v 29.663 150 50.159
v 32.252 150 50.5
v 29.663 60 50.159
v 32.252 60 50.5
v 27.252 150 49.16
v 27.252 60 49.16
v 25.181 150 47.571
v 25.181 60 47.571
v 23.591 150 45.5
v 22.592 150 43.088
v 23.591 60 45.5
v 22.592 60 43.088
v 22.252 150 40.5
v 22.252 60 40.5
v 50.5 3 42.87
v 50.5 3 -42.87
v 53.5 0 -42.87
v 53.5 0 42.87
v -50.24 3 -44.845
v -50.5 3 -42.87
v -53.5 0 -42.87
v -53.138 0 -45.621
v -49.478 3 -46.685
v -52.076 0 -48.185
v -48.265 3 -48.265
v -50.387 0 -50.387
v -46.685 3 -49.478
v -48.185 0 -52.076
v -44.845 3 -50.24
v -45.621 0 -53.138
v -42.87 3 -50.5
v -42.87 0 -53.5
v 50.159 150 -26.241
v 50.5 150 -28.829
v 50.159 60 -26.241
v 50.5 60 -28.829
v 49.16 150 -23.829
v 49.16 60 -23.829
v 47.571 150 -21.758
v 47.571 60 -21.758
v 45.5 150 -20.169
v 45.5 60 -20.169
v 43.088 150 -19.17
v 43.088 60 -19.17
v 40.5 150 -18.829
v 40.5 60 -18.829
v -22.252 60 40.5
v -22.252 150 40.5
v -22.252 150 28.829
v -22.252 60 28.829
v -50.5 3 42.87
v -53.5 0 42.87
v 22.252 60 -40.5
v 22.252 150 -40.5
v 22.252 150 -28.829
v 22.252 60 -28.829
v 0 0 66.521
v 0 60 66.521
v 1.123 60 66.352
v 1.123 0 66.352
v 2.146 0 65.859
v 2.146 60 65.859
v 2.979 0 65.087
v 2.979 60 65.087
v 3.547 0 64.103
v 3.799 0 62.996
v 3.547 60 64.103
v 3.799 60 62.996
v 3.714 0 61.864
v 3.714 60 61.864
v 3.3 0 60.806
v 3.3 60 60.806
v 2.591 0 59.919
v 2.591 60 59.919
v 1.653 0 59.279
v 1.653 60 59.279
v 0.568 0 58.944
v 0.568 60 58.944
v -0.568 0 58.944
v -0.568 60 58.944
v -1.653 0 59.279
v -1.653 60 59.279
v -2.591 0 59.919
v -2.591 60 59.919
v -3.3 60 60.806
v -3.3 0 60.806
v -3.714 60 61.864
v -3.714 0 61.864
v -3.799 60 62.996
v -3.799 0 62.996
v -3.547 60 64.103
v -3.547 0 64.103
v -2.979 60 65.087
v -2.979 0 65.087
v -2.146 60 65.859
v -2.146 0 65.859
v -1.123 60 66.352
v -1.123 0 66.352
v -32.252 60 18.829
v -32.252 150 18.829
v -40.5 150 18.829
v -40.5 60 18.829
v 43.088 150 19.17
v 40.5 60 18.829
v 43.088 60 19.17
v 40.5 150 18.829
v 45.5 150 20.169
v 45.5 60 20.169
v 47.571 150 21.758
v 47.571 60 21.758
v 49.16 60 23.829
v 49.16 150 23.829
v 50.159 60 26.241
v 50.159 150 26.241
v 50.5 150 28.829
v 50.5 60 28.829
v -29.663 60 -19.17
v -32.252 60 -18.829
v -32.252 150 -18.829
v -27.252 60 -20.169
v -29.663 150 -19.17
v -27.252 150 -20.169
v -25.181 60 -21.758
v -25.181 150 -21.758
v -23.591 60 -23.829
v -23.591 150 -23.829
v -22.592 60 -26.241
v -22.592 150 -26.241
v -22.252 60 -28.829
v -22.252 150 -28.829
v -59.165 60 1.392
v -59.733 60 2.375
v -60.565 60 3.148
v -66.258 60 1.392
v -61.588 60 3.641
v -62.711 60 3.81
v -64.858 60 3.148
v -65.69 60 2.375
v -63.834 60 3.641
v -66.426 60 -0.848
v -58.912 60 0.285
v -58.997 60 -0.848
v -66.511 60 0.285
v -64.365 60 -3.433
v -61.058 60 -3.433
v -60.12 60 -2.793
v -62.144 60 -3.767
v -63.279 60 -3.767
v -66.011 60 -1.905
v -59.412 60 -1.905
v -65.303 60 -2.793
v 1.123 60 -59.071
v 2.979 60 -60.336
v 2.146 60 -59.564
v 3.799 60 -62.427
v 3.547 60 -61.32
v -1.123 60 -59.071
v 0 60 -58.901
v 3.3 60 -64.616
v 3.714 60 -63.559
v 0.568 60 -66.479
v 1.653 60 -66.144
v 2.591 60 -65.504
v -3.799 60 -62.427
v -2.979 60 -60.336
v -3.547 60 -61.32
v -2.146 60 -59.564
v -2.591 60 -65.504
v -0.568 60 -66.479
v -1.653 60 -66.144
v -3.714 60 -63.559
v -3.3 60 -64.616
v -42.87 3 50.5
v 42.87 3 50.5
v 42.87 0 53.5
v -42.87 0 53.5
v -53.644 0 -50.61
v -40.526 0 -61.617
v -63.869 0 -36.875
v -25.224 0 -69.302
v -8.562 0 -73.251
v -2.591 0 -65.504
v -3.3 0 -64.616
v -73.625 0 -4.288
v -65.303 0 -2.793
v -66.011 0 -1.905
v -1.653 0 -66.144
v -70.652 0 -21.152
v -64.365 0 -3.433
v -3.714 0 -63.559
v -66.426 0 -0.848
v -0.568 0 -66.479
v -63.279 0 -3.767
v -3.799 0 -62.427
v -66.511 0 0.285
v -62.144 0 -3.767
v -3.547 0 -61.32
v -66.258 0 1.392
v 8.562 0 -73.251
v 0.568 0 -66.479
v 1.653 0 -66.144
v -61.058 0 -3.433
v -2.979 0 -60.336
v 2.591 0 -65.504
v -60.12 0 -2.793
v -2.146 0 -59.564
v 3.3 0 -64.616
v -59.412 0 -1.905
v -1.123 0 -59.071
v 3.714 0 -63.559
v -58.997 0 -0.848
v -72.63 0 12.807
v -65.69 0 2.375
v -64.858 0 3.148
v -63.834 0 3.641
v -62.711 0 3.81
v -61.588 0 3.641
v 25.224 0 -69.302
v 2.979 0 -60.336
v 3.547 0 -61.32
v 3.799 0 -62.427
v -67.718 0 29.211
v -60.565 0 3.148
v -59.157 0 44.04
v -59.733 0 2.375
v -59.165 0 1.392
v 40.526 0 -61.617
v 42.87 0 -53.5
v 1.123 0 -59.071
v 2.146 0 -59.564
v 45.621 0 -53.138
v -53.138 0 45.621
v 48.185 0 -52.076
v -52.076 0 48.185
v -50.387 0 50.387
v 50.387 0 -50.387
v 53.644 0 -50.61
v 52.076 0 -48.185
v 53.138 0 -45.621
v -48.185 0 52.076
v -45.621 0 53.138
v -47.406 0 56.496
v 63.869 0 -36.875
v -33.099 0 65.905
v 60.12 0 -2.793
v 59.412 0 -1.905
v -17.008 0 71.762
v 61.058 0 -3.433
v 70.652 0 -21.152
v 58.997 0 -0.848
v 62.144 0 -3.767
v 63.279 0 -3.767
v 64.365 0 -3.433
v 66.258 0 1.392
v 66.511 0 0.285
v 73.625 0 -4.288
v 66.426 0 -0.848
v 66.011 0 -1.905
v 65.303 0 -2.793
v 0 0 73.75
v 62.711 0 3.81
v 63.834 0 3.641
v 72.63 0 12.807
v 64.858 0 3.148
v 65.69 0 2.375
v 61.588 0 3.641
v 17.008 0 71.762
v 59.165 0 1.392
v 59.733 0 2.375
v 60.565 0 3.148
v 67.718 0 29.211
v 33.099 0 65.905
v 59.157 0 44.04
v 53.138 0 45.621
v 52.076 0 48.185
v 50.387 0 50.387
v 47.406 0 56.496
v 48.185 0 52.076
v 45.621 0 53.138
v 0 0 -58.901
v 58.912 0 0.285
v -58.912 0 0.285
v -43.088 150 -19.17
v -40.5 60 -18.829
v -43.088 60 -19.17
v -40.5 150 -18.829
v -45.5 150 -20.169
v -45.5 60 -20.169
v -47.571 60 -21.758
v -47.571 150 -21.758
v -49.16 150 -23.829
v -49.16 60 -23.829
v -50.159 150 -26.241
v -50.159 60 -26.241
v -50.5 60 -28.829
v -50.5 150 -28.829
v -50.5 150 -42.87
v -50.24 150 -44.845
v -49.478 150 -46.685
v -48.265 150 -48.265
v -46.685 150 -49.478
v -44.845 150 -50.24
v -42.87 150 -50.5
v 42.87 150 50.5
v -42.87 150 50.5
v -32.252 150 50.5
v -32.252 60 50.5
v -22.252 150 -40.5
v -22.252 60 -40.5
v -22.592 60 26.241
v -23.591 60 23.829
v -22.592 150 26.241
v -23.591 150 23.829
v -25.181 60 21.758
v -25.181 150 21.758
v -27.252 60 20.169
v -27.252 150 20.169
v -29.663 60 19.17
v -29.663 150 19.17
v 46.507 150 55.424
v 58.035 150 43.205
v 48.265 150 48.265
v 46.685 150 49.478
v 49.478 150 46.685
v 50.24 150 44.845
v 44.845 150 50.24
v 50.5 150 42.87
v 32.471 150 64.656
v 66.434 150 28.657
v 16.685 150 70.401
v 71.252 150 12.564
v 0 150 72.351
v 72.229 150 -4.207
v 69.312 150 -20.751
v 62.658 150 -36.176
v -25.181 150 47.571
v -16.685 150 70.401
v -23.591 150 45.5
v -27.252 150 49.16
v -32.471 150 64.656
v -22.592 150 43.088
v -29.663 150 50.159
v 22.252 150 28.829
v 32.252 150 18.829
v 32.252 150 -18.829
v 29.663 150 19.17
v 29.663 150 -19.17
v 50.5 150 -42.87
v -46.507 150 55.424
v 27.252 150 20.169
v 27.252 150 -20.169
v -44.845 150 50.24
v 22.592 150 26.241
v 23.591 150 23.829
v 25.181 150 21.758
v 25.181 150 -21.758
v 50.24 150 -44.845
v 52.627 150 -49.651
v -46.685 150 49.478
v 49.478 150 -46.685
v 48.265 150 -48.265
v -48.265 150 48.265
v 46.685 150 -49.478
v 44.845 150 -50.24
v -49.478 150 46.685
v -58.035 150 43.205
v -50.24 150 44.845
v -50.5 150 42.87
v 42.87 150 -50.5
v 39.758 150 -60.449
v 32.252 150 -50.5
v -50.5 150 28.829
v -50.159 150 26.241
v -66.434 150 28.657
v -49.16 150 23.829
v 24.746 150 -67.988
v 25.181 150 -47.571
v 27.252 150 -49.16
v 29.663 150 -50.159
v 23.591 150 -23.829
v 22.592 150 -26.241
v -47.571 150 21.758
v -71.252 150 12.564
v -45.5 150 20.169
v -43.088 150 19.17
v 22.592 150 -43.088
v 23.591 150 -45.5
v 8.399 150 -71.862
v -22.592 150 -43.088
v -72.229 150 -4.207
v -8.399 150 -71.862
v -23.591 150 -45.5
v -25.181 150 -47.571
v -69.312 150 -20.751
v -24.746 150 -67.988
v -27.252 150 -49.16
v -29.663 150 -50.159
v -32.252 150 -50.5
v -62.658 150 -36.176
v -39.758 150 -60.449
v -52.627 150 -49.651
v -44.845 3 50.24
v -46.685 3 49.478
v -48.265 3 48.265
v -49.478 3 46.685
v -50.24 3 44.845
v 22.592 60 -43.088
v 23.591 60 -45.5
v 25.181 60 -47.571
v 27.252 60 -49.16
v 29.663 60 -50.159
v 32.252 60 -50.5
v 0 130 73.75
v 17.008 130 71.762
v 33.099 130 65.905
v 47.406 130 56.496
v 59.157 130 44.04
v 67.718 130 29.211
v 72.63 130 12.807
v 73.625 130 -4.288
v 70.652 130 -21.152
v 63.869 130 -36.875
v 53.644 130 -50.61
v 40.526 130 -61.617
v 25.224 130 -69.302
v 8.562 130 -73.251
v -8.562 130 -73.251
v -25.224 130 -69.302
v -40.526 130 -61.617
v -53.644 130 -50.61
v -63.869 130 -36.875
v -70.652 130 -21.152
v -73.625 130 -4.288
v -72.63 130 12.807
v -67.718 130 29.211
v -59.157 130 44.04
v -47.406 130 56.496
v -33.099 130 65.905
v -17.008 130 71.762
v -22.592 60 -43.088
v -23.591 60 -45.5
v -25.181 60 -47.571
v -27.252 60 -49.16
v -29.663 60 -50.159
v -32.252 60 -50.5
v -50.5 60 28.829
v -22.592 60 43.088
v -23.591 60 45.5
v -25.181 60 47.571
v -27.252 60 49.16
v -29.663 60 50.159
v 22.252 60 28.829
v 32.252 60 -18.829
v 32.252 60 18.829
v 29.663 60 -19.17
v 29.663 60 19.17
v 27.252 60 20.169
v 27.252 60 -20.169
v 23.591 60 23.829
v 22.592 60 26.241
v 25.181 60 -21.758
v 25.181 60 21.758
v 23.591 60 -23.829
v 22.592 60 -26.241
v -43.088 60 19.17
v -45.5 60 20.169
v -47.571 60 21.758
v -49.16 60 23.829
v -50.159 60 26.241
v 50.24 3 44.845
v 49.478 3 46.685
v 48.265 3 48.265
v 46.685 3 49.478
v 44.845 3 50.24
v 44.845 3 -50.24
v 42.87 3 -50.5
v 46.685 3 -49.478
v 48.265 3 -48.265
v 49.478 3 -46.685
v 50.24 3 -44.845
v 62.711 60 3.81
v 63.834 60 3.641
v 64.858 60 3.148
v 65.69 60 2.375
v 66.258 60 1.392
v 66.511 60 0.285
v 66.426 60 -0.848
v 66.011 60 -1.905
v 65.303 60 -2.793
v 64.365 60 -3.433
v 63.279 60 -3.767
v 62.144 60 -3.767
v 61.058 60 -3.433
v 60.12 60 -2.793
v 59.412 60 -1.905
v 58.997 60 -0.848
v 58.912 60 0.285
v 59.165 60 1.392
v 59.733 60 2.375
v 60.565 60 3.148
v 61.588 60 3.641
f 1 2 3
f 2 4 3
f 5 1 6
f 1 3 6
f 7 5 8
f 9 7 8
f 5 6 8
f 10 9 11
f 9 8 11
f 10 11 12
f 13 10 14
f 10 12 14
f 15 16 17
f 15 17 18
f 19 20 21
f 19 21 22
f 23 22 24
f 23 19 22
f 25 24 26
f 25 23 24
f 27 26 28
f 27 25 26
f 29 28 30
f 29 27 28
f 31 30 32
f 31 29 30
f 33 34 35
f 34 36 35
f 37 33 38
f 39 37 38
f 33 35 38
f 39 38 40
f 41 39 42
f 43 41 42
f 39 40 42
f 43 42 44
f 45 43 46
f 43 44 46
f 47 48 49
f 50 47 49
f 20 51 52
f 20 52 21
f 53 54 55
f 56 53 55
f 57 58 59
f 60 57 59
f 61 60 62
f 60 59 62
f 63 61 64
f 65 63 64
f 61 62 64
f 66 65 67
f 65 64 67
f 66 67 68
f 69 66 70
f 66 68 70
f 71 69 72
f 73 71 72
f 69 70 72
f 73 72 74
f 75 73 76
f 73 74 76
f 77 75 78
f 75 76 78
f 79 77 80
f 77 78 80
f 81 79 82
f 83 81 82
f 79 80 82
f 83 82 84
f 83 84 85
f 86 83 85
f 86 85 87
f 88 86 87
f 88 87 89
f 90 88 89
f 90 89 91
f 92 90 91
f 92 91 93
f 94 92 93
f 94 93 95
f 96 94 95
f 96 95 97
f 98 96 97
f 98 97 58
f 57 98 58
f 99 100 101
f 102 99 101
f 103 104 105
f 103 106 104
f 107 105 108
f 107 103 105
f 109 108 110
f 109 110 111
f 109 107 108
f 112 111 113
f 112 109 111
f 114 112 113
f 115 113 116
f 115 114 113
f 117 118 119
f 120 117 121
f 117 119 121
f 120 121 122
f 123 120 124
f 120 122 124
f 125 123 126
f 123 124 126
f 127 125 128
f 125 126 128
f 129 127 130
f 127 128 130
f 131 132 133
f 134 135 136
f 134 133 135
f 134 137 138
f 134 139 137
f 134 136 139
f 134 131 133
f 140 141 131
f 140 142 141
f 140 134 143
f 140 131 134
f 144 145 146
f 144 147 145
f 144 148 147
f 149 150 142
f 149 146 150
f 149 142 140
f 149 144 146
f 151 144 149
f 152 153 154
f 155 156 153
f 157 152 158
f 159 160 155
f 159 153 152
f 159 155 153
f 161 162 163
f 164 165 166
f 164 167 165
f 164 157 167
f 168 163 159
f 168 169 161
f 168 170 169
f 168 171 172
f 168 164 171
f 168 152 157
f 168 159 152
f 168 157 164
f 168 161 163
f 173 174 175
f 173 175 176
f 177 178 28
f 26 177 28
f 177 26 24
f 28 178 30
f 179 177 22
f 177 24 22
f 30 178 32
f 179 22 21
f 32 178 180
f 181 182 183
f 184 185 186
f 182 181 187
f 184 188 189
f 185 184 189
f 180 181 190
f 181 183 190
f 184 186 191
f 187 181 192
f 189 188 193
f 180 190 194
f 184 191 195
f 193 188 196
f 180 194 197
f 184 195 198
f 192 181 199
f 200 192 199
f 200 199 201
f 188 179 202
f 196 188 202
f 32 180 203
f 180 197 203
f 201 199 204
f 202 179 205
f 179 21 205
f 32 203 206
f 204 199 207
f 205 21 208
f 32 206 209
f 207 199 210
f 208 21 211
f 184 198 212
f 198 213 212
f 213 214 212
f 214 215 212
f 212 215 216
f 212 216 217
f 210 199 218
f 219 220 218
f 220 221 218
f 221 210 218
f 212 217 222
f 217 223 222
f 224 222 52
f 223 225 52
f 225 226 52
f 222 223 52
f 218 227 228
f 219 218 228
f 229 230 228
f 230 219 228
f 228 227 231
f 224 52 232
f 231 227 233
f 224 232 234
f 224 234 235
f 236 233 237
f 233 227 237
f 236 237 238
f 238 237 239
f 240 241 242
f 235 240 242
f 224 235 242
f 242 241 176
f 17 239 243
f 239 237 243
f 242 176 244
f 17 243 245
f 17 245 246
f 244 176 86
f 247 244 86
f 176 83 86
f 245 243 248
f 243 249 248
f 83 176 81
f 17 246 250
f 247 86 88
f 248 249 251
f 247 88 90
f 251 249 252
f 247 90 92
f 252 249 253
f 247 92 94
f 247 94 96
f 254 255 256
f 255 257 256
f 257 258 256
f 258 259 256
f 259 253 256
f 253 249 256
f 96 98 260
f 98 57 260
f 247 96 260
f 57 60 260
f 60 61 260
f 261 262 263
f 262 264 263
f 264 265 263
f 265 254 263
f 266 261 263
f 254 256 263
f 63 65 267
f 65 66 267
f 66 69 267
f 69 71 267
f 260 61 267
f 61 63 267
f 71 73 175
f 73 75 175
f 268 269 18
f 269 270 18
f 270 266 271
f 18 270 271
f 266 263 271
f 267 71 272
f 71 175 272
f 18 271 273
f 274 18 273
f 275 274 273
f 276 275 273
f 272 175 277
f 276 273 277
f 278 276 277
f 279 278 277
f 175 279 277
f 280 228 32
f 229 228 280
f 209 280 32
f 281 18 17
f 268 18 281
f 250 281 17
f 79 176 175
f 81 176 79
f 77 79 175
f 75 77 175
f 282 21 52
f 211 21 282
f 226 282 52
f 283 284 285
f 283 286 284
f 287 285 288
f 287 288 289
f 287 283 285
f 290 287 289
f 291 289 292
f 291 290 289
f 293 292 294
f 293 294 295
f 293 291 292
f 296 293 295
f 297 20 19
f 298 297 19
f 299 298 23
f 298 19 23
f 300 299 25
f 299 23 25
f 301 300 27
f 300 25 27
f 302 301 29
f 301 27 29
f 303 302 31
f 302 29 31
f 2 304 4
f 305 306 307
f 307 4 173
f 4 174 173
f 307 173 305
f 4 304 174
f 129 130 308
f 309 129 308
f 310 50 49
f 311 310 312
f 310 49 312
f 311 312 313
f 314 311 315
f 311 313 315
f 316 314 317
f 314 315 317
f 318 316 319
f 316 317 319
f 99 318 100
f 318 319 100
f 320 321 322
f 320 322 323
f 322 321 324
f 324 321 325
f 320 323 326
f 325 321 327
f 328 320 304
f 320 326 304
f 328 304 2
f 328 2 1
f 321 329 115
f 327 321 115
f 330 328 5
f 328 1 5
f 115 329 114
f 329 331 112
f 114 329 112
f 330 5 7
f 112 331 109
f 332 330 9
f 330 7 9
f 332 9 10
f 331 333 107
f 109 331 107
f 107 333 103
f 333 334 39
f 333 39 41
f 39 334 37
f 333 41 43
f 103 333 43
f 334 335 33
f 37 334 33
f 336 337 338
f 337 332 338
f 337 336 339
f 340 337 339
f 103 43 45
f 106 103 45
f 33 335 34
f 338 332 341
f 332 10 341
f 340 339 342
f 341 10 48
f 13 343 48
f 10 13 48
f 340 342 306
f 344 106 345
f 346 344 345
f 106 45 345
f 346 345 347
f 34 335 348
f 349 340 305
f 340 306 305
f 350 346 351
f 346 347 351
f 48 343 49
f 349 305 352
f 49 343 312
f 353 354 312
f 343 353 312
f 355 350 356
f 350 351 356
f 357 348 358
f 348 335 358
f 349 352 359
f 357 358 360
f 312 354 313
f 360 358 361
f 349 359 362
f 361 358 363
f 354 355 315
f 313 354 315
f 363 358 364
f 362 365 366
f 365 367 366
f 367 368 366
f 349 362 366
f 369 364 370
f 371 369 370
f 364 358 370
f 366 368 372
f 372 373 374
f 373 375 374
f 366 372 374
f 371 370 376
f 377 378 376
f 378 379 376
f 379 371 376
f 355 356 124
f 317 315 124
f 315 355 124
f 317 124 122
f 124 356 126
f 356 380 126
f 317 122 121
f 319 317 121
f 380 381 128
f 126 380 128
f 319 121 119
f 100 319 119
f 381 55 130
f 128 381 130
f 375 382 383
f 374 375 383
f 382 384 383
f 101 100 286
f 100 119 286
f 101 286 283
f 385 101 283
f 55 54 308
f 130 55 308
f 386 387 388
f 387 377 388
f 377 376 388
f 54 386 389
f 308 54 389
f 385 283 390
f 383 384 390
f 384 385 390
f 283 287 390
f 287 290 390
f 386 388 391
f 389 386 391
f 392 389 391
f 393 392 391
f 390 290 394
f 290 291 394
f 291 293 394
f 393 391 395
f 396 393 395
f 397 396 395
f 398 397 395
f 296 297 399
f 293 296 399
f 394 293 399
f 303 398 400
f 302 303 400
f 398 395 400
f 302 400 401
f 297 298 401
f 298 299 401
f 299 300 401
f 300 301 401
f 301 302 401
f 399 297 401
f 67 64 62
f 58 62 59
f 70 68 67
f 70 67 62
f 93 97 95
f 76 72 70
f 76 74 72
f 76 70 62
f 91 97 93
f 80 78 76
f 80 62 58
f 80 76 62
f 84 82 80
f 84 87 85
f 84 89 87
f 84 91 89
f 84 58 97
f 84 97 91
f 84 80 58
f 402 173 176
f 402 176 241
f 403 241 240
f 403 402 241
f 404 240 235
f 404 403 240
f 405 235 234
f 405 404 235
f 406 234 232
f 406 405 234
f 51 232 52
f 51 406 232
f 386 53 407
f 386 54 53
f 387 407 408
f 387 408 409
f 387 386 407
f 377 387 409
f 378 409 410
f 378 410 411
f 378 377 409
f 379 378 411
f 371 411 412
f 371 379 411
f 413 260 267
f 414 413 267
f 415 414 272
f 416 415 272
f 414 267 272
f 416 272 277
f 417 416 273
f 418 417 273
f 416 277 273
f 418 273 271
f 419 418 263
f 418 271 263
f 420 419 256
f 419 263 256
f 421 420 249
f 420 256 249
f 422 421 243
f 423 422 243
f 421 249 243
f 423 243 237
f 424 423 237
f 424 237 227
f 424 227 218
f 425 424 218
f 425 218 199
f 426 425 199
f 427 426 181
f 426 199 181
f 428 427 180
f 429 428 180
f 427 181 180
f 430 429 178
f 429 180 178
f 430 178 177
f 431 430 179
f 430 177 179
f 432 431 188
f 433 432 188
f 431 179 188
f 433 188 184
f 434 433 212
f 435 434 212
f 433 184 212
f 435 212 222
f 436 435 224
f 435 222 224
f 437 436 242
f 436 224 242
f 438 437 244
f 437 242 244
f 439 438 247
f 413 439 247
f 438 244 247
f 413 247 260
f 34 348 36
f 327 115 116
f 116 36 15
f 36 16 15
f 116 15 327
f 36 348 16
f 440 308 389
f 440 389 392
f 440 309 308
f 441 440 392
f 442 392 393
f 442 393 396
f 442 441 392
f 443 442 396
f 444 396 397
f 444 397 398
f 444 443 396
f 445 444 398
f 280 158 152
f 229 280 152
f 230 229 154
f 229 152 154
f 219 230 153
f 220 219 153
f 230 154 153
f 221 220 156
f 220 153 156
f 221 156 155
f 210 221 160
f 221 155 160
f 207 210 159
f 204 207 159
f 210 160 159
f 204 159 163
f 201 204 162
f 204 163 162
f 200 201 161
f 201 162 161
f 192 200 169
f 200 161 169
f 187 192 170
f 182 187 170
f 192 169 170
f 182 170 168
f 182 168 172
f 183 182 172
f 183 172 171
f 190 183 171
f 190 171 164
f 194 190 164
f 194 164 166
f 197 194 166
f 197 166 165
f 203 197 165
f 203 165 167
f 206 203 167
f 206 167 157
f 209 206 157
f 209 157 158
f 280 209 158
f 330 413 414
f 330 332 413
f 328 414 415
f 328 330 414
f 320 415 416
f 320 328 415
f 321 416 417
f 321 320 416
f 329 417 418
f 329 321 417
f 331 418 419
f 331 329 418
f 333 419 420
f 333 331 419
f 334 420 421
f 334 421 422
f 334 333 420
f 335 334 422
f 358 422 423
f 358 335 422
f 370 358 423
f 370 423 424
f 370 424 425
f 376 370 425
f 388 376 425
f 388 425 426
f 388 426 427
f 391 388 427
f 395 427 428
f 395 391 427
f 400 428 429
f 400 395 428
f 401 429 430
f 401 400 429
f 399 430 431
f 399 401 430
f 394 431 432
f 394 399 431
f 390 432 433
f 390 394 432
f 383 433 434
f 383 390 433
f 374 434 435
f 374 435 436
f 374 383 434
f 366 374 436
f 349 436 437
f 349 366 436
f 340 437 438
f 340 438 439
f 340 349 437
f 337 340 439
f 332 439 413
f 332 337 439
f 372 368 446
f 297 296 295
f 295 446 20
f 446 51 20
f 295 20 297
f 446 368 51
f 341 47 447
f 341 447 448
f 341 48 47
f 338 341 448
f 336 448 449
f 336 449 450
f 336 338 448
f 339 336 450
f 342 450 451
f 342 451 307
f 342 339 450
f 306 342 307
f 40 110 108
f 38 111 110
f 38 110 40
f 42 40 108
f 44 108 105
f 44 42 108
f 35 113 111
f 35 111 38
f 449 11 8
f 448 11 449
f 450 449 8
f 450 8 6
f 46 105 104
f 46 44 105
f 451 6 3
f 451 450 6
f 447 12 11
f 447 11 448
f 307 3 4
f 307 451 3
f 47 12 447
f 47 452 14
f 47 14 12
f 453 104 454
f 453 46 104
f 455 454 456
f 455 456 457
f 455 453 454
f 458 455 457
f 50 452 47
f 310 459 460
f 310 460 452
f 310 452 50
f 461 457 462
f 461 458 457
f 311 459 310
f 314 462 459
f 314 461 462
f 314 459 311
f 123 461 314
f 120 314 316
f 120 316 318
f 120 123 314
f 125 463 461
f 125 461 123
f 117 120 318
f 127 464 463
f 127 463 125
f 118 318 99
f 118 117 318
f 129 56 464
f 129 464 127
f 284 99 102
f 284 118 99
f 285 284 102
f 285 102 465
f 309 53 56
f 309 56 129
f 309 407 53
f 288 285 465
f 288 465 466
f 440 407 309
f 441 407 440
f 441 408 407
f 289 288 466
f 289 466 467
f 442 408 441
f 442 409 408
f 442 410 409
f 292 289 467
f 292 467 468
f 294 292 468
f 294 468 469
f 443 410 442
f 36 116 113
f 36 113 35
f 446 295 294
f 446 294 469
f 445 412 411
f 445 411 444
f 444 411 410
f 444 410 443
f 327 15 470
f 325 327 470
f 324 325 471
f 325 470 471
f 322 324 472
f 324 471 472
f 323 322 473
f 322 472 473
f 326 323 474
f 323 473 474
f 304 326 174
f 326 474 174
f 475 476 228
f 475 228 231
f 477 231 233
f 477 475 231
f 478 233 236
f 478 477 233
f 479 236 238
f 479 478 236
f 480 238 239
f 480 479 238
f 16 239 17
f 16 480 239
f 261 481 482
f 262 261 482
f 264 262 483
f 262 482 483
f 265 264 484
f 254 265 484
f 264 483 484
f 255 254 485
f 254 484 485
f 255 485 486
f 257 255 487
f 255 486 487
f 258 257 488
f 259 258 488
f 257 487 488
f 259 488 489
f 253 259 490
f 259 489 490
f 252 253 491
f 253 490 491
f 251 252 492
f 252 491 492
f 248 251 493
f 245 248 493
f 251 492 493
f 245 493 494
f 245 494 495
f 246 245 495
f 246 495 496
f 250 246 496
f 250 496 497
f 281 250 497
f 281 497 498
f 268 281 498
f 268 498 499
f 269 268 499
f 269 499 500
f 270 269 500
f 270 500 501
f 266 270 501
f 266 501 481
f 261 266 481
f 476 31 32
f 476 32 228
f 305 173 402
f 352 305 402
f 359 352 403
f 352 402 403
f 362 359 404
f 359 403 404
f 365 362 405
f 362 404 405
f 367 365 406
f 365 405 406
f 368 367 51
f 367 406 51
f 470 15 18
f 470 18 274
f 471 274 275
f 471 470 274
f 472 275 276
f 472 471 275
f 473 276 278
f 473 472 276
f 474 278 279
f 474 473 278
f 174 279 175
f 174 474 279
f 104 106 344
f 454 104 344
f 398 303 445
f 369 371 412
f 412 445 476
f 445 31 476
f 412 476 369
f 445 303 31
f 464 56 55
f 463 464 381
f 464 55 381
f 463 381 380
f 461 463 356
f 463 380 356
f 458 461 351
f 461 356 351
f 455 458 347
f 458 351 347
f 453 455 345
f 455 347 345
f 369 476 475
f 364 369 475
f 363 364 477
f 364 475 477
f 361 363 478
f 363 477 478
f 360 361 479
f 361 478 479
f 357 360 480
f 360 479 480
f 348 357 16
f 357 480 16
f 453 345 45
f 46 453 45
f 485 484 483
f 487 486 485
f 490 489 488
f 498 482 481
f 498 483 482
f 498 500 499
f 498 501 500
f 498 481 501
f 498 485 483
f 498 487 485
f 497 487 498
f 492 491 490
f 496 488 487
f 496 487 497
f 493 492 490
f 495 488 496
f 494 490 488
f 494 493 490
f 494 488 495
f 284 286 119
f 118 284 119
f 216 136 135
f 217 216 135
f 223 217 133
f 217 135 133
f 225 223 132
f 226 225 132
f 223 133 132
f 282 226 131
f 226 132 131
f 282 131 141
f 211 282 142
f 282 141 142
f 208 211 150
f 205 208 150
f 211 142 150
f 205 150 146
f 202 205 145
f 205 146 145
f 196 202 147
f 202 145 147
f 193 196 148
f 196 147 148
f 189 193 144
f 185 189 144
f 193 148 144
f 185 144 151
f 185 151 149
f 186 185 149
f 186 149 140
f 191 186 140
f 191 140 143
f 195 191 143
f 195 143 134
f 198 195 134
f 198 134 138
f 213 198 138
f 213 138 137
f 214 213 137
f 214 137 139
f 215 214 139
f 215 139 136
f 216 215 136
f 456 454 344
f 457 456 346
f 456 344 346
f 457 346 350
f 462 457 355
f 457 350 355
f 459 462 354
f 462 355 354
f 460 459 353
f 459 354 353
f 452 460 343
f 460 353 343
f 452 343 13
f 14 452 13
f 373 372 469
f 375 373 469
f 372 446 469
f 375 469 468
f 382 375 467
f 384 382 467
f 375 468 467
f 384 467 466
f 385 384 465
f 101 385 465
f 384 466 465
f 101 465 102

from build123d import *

# Parameters (mm, degrees)
SKETCH2_R           = 73.75
MAINDOUGHNUT_DEPTH  = 150
SKETCH3_R           = 3.81
CUT_EXTRUDE1_DEPTH  = 183.696811685
NOSECONETAPER_SIZE  = 20
NOSECONETAPER_SIZE2 = 1.398536239
PAYLOADSTOPS_DEPTH  = 90
FILLET1_R           = 10
FILLET2_R           = 10
FILLET3_R           = 10
CHAMFER1_SIZE       = 3


with BuildPart() as part:
    # Sketch2 → MainDoughnut (new body)
    with BuildSketch(Plane(origin=(0, 0, 0), x_dir=(1, 0, 0), z_dir=(0, 1, 0))):
        with Locations(Location((0, 0, 0), (0, 0, 270))):
            Circle(SKETCH2_R)
        with BuildLine():
            Line((42.87, -50.5), (-42.87, -50.5))
            ThreePointArc((-42.87, -50.5), (-48.26522474, -48.26522474), (-50.5, -42.87))
            Line((-50.5, -42.87), (-50.5, 42.87))
            ThreePointArc((-50.5, 42.87), (-48.26522474, 48.26522474), (-42.87, 50.5))
            Line((-42.87, 50.5), (42.87, 50.5))
            ThreePointArc((42.87, 50.5), (48.26522474, 48.26522474), (50.5, 42.87))
            Line((50.5, 42.87), (50.5, -42.87))
            ThreePointArc((50.5, -42.87), (48.26522474, -48.26522474), (42.87, -50.5))
        make_face(mode=Mode.SUBTRACT)
    extrude(amount=MAINDOUGHNUT_DEPTH)

    # Sketch3 → Cut-Extrude1 (cut, through all)
    with BuildSketch(Plane(origin=(0, 150, 0), x_dir=(1, 0, 0), z_dir=(0, 1, 0))):
        with Locations(Location((-62.711477498, 0, 0), (0, 0, 270))):
            Circle(SKETCH3_R)
        with Locations(Location((0, 62.711477498, 0), (0, 0, 270))):
            Circle(SKETCH3_R)
        with Locations(Location((62.711477498, 0, 0), (0, 0, 270))):
            Circle(SKETCH3_R)
        with Locations(Location((0, -62.711477498, 0), (0, 0, 270))):
            Circle(SKETCH3_R)
    extrude(amount=-CUT_EXTRUDE1_DEPTH, mode=Mode.SUBTRACT)

    # NoseconeTaper
    noseconetaper_edges = [part.edges().sort_by_distance(p)[0] for p in [
        (0, 150, -73.75),
    ]]
    noseconetaper_side = [part.faces().sort_by_distance(p)[0] for p in [
        (0, 75, -73.75),
    ]]
    chamfer(noseconetaper_edges, length=NOSECONETAPER_SIZE, length2=NOSECONETAPER_SIZE2, reference=noseconetaper_side[0])

    # Sketch5 → PayloadStops (add)
    with BuildSketch(Plane(origin=(0, 150, 0), x_dir=(1, 0, 0), z_dir=(0, 1, 0))):
        with BuildLine():
            Line((-22.25166399, 28.829478379), (-22.25166399, 68.844736604))
            Line((-22.25166399, 68.844736604), (22.25166399, 68.844736604))
            Line((22.25166399, 68.844736604), (22.25166399, 28.829478379))
            ThreePointArc((22.25166399, 28.829478379), (25.180596178, 21.758410568), (32.25166399, 18.829478379))
            Line((32.25166399, 18.829478379), (68.578942308, 18.829478379))
            Line((68.578942308, 18.829478379), (68.578942308, -18.829478379))
            Line((68.578942308, -18.829478379), (32.25166399, -18.829478379))
            ThreePointArc((32.25166399, -18.829478379), (25.180596178, -21.758410568), (22.25166399, -28.829478379))
            Line((22.25166399, -28.829478379), (22.25166399, -67.546162244))
            Line((22.25166399, -67.546162244), (-22.25166399, -67.546162244))
            Line((-22.25166399, -67.546162244), (-22.25166399, -28.829478379))
            ThreePointArc((-22.25166399, -28.829478379), (-25.180596178, -21.758410568), (-32.25166399, -18.829478379))
            Line((-32.25166399, -18.829478379), (-69.858321282, -18.829478379))
            Line((-69.858321282, -18.829478379), (-69.858321282, 18.829478379))
            Line((-69.858321282, 18.829478379), (-32.25166399, 18.829478379))
            ThreePointArc((-32.25166399, 18.829478379), (-25.180596178, 21.758410568), (-22.25166399, 28.829478379))
        make_face()
    extrude(amount=-PAYLOADSTOPS_DEPTH)

    # Fillet1
    fillet1_edges = [part.edges().sort_by_distance(p)[0] for p in [
        (-22.25166399, 105, -50.5),
    ]]
    fillet(fillet1_edges, radius=FILLET1_R)

    # Fillet2
    fillet2_edges = [part.edges().sort_by_distance(p)[0] for p in [
        (-50.5, 105, -18.829478379),
    ]]
    fillet(fillet2_edges, radius=FILLET2_R)

    # Fillet3
    fillet3_edges = [part.edges().sort_by_distance(p)[0] for p in [
        (50.5, 105, 18.829478379),
        (50.5, 105, -18.829478379),
        (-22.25166399, 105, 50.5),
        (22.25166399, 105, 50.5),
        (22.25166399, 105, -50.5),
        (-50.5, 105, 18.829478379),
    ]]
    fillet(fillet3_edges, radius=FILLET3_R)

    # Chamfer1
    chamfer1_edges = [part.edges().sort_by_distance(p)[0] for p in [
        (-48.26522474, 0, -48.26522474),
        (-50.5, 0, 0),
        (-48.26522474, 0, 48.26522474),
        (0, 0, 50.5),
        (48.26522474, 0, 48.26522474),
        (50.5, 0, 0),
        (48.26522474, 0, -48.26522474),
        (0, 0, -50.5),
    ]]
    chamfer(chamfer1_edges, length=CHAMFER1_SIZE)


solid = part.part
